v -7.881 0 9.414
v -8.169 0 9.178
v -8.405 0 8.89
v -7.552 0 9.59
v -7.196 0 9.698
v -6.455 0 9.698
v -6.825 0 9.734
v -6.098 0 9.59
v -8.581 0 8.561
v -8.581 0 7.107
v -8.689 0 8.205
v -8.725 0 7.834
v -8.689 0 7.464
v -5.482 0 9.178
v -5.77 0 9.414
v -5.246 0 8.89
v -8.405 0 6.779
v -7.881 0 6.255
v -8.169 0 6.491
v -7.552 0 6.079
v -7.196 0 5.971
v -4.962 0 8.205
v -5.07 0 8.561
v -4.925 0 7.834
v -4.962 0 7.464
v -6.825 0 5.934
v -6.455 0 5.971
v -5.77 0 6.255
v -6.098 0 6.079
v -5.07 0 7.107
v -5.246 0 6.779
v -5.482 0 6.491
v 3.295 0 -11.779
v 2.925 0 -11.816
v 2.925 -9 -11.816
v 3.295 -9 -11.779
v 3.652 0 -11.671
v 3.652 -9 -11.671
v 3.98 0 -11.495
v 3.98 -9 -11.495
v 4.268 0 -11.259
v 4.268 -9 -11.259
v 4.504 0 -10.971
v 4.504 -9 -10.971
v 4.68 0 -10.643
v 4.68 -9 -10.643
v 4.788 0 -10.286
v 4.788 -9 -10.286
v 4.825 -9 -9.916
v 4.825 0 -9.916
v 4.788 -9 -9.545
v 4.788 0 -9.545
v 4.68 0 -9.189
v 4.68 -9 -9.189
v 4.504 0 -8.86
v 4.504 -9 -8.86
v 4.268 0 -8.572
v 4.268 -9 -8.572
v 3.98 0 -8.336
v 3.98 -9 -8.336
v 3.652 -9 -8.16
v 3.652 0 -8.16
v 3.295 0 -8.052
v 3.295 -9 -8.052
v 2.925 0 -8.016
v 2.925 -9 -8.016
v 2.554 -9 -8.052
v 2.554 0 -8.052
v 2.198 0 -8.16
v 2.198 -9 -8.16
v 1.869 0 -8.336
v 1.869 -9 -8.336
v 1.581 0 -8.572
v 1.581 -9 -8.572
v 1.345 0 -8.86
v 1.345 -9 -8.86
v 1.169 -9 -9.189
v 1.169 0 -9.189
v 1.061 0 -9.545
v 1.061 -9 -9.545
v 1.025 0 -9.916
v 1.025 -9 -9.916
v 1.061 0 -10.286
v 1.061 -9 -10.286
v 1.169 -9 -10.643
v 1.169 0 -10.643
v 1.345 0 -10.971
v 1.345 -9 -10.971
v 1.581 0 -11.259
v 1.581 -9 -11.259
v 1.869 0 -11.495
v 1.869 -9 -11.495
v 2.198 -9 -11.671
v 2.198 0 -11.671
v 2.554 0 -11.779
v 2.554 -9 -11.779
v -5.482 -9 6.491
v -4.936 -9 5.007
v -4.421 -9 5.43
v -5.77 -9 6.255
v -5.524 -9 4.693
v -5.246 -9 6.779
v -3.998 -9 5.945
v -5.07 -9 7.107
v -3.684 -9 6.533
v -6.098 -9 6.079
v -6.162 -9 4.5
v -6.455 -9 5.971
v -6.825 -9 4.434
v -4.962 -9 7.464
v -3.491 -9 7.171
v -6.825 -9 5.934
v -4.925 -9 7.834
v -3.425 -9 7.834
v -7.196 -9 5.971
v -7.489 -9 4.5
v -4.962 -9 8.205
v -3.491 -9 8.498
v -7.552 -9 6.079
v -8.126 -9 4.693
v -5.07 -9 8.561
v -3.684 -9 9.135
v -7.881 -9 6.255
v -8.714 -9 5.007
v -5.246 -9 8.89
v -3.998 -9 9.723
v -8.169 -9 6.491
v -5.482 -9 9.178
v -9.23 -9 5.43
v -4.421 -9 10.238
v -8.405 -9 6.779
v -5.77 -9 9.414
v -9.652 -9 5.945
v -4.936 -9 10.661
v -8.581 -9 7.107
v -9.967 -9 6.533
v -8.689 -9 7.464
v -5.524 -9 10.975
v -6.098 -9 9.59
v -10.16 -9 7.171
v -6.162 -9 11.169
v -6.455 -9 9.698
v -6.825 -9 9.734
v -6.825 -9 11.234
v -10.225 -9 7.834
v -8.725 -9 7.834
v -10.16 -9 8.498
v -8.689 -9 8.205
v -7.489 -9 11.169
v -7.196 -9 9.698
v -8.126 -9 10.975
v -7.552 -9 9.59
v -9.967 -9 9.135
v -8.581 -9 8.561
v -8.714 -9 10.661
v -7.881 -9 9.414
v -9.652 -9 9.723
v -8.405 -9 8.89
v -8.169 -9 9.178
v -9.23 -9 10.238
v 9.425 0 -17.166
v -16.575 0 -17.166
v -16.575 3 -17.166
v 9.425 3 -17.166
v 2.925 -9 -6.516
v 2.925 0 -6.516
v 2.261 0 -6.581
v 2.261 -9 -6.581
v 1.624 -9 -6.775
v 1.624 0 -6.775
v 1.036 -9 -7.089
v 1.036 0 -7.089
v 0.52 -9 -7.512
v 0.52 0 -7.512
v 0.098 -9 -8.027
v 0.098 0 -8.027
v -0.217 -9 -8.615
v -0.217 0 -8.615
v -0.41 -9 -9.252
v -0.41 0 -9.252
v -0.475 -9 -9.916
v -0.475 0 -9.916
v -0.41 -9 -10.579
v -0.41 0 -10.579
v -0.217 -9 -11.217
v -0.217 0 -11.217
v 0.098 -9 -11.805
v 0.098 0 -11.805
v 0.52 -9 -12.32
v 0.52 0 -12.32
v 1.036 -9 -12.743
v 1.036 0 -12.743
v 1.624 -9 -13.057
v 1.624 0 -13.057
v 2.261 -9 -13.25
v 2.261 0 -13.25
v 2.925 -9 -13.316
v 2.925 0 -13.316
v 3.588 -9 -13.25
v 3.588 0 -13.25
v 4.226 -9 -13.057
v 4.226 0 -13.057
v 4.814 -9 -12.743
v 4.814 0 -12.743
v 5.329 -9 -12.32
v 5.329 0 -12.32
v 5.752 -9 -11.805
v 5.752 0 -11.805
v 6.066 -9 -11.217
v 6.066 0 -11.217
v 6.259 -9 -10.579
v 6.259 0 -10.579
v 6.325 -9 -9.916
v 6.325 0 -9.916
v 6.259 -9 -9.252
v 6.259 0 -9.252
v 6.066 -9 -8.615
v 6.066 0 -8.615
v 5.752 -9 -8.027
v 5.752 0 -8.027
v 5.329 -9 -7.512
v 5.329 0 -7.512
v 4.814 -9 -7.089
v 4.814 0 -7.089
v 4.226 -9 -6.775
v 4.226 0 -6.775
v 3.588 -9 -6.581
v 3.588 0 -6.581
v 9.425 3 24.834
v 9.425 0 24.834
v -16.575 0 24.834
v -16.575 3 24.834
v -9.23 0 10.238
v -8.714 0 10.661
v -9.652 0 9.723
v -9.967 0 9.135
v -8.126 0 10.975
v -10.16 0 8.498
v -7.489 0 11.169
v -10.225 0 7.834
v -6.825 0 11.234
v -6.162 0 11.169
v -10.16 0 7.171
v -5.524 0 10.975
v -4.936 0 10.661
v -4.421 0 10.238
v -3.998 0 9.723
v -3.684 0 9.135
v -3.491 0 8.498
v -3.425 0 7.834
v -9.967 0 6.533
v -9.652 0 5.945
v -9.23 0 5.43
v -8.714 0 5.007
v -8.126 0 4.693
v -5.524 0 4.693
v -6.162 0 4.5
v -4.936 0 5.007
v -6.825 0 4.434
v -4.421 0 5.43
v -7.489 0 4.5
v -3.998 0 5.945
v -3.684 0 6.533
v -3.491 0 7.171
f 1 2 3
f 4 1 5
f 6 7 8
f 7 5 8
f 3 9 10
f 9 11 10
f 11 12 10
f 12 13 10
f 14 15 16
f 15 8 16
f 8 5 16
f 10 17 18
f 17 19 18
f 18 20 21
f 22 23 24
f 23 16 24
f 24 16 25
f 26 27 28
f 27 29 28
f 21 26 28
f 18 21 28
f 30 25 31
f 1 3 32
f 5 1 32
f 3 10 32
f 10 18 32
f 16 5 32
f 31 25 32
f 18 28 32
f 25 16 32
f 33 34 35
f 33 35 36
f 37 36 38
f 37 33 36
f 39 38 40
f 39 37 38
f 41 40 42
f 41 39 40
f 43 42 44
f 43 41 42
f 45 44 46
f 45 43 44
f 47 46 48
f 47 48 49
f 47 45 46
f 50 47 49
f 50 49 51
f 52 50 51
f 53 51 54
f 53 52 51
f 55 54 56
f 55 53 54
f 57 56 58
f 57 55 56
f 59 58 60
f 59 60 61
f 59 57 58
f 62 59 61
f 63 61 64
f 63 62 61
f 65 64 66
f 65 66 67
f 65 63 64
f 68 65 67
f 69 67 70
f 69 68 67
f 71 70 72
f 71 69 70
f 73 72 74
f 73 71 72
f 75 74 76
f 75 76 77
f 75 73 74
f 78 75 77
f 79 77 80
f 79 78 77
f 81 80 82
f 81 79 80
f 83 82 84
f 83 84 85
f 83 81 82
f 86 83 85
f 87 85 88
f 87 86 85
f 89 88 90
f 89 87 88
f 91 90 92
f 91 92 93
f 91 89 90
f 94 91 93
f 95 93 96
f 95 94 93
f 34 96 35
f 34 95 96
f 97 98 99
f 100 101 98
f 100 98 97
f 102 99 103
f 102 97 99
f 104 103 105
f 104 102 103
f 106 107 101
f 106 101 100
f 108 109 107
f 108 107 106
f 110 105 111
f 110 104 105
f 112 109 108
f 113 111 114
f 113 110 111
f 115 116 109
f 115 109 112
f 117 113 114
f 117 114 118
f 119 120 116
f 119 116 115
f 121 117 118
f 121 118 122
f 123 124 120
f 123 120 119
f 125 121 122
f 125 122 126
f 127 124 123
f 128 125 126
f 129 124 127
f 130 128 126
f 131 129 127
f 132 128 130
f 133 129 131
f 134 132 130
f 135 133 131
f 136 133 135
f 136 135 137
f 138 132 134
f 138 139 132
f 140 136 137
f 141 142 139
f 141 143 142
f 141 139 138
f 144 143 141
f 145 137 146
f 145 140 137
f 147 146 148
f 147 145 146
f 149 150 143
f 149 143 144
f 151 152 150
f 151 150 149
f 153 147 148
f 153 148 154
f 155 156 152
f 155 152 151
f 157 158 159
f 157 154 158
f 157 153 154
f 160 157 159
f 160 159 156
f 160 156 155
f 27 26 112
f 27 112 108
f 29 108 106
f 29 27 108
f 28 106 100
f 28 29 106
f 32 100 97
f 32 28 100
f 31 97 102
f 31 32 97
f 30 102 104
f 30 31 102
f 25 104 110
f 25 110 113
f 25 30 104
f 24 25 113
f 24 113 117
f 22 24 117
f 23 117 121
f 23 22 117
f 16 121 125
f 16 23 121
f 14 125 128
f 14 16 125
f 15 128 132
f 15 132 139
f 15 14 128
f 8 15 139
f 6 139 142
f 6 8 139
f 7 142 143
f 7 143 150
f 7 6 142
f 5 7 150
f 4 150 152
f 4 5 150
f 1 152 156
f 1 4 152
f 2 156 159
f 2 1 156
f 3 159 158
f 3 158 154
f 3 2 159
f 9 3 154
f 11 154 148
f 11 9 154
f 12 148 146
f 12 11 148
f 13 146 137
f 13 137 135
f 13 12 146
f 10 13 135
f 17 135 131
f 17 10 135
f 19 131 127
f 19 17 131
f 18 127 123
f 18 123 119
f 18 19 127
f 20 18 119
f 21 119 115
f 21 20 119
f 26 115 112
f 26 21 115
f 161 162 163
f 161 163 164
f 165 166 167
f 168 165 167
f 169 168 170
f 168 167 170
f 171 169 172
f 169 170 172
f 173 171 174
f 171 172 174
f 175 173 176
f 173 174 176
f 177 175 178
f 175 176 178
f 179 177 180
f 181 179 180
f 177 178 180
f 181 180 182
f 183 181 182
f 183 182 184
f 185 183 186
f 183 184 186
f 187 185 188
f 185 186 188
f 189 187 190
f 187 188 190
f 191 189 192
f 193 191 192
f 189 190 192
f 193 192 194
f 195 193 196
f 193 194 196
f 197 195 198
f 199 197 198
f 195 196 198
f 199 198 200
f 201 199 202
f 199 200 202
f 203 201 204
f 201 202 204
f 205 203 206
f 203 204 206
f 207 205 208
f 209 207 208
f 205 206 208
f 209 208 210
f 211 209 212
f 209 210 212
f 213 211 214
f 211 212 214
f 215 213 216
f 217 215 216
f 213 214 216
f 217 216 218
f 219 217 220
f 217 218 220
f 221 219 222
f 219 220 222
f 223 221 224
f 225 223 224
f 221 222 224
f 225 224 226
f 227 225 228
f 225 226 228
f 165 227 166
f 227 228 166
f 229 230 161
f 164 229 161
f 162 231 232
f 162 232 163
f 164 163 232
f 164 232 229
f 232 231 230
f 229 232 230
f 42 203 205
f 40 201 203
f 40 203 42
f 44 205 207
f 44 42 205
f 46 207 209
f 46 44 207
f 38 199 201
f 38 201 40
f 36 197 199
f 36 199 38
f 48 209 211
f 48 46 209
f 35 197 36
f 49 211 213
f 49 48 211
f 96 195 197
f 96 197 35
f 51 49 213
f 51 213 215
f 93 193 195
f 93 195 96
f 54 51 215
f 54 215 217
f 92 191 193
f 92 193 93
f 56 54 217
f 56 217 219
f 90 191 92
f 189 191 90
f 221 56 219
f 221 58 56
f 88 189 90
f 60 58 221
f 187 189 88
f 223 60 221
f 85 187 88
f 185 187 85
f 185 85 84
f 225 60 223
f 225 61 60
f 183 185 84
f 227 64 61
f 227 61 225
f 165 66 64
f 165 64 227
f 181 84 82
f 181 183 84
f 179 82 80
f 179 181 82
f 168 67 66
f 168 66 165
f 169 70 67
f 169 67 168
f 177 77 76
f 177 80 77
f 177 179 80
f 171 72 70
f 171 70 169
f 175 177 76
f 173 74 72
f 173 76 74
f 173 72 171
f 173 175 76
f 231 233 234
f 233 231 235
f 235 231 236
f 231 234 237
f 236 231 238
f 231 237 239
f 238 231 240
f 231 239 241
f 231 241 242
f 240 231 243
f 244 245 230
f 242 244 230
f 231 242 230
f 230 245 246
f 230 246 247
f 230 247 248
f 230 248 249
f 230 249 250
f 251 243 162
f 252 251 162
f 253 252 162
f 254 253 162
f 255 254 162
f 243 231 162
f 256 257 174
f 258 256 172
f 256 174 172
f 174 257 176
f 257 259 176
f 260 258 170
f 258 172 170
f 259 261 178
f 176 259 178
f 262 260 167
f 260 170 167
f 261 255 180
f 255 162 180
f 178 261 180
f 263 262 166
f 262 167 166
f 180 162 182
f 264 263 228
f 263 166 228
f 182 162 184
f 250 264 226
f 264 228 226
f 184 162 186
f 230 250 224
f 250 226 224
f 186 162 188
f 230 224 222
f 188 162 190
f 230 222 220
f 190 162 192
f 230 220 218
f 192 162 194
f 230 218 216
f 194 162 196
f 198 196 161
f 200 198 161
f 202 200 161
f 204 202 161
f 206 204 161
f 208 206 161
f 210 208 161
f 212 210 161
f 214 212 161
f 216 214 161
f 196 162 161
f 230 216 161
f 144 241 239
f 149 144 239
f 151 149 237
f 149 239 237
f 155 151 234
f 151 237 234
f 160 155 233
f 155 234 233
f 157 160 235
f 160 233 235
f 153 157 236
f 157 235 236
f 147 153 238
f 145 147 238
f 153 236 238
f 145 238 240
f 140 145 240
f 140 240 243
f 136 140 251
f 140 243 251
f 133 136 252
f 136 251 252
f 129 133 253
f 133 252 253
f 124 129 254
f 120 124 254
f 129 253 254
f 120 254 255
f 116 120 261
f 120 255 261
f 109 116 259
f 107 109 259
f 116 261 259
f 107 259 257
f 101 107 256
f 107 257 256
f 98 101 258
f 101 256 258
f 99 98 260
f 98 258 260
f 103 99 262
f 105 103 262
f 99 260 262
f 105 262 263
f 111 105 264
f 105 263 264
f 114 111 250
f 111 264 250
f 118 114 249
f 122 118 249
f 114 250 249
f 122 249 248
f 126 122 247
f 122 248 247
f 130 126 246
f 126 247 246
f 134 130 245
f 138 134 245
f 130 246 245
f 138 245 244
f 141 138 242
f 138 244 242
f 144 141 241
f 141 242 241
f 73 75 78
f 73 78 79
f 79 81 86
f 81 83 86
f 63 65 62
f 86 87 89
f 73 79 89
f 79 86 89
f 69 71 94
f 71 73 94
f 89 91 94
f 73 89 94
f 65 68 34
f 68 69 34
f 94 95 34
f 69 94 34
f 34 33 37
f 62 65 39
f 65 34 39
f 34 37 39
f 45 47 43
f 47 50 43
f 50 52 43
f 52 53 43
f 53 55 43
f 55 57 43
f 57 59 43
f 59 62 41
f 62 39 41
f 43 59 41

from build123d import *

# Parameters (mm, degrees)
SKETCH1_W           = 26
SKETCH1_H           = 42
BOSS_EXTRUDE1_DEPTH = 3
SKETCH4_R           = 3.4
SKETCH4_R_2         = 1.9
BOSS_EXTRUDE2_DEPTH = 9


with BuildPart() as part:
    # Sketch1 → Boss-Extrude1 (new body)
    with BuildSketch(Plane(origin=(0, 0, 0), x_dir=(1, 0, 0), z_dir=(0, 1, 0))):
        with Locations((-3.575345375, -3.834293295)):
            Rectangle(SKETCH1_W, SKETCH1_H)
    extrude(amount=BOSS_EXTRUDE1_DEPTH)

    # Sketch4 → Boss-Extrude2 (add)
    # profile 1 of 2: a face of its own
    with BuildSketch(Plane.XZ):
        with Locations(Location((-6.825345375, 7.834293295, 0), (0, 0, 90))):
            Circle(SKETCH4_R)
        with Locations(Location((-6.825345375, 7.834293295, 0), (0, 0, 270))):
            Circle(SKETCH4_R_2, mode=Mode.SUBTRACT)
    # profile 2 of 2: a face of its own
    with BuildSketch(Plane.XZ):
        with Locations(Location((2.924654625, -9.915706705, 0), (0, 0, 90))):
            Circle(SKETCH4_R)
        with Locations(Location((2.924654625, -9.915706705, 0), (0, 0, 270))):
            Circle(SKETCH4_R_2, mode=Mode.SUBTRACT)
    extrude(amount=BOSS_EXTRUDE2_DEPTH)


solid = part.part
